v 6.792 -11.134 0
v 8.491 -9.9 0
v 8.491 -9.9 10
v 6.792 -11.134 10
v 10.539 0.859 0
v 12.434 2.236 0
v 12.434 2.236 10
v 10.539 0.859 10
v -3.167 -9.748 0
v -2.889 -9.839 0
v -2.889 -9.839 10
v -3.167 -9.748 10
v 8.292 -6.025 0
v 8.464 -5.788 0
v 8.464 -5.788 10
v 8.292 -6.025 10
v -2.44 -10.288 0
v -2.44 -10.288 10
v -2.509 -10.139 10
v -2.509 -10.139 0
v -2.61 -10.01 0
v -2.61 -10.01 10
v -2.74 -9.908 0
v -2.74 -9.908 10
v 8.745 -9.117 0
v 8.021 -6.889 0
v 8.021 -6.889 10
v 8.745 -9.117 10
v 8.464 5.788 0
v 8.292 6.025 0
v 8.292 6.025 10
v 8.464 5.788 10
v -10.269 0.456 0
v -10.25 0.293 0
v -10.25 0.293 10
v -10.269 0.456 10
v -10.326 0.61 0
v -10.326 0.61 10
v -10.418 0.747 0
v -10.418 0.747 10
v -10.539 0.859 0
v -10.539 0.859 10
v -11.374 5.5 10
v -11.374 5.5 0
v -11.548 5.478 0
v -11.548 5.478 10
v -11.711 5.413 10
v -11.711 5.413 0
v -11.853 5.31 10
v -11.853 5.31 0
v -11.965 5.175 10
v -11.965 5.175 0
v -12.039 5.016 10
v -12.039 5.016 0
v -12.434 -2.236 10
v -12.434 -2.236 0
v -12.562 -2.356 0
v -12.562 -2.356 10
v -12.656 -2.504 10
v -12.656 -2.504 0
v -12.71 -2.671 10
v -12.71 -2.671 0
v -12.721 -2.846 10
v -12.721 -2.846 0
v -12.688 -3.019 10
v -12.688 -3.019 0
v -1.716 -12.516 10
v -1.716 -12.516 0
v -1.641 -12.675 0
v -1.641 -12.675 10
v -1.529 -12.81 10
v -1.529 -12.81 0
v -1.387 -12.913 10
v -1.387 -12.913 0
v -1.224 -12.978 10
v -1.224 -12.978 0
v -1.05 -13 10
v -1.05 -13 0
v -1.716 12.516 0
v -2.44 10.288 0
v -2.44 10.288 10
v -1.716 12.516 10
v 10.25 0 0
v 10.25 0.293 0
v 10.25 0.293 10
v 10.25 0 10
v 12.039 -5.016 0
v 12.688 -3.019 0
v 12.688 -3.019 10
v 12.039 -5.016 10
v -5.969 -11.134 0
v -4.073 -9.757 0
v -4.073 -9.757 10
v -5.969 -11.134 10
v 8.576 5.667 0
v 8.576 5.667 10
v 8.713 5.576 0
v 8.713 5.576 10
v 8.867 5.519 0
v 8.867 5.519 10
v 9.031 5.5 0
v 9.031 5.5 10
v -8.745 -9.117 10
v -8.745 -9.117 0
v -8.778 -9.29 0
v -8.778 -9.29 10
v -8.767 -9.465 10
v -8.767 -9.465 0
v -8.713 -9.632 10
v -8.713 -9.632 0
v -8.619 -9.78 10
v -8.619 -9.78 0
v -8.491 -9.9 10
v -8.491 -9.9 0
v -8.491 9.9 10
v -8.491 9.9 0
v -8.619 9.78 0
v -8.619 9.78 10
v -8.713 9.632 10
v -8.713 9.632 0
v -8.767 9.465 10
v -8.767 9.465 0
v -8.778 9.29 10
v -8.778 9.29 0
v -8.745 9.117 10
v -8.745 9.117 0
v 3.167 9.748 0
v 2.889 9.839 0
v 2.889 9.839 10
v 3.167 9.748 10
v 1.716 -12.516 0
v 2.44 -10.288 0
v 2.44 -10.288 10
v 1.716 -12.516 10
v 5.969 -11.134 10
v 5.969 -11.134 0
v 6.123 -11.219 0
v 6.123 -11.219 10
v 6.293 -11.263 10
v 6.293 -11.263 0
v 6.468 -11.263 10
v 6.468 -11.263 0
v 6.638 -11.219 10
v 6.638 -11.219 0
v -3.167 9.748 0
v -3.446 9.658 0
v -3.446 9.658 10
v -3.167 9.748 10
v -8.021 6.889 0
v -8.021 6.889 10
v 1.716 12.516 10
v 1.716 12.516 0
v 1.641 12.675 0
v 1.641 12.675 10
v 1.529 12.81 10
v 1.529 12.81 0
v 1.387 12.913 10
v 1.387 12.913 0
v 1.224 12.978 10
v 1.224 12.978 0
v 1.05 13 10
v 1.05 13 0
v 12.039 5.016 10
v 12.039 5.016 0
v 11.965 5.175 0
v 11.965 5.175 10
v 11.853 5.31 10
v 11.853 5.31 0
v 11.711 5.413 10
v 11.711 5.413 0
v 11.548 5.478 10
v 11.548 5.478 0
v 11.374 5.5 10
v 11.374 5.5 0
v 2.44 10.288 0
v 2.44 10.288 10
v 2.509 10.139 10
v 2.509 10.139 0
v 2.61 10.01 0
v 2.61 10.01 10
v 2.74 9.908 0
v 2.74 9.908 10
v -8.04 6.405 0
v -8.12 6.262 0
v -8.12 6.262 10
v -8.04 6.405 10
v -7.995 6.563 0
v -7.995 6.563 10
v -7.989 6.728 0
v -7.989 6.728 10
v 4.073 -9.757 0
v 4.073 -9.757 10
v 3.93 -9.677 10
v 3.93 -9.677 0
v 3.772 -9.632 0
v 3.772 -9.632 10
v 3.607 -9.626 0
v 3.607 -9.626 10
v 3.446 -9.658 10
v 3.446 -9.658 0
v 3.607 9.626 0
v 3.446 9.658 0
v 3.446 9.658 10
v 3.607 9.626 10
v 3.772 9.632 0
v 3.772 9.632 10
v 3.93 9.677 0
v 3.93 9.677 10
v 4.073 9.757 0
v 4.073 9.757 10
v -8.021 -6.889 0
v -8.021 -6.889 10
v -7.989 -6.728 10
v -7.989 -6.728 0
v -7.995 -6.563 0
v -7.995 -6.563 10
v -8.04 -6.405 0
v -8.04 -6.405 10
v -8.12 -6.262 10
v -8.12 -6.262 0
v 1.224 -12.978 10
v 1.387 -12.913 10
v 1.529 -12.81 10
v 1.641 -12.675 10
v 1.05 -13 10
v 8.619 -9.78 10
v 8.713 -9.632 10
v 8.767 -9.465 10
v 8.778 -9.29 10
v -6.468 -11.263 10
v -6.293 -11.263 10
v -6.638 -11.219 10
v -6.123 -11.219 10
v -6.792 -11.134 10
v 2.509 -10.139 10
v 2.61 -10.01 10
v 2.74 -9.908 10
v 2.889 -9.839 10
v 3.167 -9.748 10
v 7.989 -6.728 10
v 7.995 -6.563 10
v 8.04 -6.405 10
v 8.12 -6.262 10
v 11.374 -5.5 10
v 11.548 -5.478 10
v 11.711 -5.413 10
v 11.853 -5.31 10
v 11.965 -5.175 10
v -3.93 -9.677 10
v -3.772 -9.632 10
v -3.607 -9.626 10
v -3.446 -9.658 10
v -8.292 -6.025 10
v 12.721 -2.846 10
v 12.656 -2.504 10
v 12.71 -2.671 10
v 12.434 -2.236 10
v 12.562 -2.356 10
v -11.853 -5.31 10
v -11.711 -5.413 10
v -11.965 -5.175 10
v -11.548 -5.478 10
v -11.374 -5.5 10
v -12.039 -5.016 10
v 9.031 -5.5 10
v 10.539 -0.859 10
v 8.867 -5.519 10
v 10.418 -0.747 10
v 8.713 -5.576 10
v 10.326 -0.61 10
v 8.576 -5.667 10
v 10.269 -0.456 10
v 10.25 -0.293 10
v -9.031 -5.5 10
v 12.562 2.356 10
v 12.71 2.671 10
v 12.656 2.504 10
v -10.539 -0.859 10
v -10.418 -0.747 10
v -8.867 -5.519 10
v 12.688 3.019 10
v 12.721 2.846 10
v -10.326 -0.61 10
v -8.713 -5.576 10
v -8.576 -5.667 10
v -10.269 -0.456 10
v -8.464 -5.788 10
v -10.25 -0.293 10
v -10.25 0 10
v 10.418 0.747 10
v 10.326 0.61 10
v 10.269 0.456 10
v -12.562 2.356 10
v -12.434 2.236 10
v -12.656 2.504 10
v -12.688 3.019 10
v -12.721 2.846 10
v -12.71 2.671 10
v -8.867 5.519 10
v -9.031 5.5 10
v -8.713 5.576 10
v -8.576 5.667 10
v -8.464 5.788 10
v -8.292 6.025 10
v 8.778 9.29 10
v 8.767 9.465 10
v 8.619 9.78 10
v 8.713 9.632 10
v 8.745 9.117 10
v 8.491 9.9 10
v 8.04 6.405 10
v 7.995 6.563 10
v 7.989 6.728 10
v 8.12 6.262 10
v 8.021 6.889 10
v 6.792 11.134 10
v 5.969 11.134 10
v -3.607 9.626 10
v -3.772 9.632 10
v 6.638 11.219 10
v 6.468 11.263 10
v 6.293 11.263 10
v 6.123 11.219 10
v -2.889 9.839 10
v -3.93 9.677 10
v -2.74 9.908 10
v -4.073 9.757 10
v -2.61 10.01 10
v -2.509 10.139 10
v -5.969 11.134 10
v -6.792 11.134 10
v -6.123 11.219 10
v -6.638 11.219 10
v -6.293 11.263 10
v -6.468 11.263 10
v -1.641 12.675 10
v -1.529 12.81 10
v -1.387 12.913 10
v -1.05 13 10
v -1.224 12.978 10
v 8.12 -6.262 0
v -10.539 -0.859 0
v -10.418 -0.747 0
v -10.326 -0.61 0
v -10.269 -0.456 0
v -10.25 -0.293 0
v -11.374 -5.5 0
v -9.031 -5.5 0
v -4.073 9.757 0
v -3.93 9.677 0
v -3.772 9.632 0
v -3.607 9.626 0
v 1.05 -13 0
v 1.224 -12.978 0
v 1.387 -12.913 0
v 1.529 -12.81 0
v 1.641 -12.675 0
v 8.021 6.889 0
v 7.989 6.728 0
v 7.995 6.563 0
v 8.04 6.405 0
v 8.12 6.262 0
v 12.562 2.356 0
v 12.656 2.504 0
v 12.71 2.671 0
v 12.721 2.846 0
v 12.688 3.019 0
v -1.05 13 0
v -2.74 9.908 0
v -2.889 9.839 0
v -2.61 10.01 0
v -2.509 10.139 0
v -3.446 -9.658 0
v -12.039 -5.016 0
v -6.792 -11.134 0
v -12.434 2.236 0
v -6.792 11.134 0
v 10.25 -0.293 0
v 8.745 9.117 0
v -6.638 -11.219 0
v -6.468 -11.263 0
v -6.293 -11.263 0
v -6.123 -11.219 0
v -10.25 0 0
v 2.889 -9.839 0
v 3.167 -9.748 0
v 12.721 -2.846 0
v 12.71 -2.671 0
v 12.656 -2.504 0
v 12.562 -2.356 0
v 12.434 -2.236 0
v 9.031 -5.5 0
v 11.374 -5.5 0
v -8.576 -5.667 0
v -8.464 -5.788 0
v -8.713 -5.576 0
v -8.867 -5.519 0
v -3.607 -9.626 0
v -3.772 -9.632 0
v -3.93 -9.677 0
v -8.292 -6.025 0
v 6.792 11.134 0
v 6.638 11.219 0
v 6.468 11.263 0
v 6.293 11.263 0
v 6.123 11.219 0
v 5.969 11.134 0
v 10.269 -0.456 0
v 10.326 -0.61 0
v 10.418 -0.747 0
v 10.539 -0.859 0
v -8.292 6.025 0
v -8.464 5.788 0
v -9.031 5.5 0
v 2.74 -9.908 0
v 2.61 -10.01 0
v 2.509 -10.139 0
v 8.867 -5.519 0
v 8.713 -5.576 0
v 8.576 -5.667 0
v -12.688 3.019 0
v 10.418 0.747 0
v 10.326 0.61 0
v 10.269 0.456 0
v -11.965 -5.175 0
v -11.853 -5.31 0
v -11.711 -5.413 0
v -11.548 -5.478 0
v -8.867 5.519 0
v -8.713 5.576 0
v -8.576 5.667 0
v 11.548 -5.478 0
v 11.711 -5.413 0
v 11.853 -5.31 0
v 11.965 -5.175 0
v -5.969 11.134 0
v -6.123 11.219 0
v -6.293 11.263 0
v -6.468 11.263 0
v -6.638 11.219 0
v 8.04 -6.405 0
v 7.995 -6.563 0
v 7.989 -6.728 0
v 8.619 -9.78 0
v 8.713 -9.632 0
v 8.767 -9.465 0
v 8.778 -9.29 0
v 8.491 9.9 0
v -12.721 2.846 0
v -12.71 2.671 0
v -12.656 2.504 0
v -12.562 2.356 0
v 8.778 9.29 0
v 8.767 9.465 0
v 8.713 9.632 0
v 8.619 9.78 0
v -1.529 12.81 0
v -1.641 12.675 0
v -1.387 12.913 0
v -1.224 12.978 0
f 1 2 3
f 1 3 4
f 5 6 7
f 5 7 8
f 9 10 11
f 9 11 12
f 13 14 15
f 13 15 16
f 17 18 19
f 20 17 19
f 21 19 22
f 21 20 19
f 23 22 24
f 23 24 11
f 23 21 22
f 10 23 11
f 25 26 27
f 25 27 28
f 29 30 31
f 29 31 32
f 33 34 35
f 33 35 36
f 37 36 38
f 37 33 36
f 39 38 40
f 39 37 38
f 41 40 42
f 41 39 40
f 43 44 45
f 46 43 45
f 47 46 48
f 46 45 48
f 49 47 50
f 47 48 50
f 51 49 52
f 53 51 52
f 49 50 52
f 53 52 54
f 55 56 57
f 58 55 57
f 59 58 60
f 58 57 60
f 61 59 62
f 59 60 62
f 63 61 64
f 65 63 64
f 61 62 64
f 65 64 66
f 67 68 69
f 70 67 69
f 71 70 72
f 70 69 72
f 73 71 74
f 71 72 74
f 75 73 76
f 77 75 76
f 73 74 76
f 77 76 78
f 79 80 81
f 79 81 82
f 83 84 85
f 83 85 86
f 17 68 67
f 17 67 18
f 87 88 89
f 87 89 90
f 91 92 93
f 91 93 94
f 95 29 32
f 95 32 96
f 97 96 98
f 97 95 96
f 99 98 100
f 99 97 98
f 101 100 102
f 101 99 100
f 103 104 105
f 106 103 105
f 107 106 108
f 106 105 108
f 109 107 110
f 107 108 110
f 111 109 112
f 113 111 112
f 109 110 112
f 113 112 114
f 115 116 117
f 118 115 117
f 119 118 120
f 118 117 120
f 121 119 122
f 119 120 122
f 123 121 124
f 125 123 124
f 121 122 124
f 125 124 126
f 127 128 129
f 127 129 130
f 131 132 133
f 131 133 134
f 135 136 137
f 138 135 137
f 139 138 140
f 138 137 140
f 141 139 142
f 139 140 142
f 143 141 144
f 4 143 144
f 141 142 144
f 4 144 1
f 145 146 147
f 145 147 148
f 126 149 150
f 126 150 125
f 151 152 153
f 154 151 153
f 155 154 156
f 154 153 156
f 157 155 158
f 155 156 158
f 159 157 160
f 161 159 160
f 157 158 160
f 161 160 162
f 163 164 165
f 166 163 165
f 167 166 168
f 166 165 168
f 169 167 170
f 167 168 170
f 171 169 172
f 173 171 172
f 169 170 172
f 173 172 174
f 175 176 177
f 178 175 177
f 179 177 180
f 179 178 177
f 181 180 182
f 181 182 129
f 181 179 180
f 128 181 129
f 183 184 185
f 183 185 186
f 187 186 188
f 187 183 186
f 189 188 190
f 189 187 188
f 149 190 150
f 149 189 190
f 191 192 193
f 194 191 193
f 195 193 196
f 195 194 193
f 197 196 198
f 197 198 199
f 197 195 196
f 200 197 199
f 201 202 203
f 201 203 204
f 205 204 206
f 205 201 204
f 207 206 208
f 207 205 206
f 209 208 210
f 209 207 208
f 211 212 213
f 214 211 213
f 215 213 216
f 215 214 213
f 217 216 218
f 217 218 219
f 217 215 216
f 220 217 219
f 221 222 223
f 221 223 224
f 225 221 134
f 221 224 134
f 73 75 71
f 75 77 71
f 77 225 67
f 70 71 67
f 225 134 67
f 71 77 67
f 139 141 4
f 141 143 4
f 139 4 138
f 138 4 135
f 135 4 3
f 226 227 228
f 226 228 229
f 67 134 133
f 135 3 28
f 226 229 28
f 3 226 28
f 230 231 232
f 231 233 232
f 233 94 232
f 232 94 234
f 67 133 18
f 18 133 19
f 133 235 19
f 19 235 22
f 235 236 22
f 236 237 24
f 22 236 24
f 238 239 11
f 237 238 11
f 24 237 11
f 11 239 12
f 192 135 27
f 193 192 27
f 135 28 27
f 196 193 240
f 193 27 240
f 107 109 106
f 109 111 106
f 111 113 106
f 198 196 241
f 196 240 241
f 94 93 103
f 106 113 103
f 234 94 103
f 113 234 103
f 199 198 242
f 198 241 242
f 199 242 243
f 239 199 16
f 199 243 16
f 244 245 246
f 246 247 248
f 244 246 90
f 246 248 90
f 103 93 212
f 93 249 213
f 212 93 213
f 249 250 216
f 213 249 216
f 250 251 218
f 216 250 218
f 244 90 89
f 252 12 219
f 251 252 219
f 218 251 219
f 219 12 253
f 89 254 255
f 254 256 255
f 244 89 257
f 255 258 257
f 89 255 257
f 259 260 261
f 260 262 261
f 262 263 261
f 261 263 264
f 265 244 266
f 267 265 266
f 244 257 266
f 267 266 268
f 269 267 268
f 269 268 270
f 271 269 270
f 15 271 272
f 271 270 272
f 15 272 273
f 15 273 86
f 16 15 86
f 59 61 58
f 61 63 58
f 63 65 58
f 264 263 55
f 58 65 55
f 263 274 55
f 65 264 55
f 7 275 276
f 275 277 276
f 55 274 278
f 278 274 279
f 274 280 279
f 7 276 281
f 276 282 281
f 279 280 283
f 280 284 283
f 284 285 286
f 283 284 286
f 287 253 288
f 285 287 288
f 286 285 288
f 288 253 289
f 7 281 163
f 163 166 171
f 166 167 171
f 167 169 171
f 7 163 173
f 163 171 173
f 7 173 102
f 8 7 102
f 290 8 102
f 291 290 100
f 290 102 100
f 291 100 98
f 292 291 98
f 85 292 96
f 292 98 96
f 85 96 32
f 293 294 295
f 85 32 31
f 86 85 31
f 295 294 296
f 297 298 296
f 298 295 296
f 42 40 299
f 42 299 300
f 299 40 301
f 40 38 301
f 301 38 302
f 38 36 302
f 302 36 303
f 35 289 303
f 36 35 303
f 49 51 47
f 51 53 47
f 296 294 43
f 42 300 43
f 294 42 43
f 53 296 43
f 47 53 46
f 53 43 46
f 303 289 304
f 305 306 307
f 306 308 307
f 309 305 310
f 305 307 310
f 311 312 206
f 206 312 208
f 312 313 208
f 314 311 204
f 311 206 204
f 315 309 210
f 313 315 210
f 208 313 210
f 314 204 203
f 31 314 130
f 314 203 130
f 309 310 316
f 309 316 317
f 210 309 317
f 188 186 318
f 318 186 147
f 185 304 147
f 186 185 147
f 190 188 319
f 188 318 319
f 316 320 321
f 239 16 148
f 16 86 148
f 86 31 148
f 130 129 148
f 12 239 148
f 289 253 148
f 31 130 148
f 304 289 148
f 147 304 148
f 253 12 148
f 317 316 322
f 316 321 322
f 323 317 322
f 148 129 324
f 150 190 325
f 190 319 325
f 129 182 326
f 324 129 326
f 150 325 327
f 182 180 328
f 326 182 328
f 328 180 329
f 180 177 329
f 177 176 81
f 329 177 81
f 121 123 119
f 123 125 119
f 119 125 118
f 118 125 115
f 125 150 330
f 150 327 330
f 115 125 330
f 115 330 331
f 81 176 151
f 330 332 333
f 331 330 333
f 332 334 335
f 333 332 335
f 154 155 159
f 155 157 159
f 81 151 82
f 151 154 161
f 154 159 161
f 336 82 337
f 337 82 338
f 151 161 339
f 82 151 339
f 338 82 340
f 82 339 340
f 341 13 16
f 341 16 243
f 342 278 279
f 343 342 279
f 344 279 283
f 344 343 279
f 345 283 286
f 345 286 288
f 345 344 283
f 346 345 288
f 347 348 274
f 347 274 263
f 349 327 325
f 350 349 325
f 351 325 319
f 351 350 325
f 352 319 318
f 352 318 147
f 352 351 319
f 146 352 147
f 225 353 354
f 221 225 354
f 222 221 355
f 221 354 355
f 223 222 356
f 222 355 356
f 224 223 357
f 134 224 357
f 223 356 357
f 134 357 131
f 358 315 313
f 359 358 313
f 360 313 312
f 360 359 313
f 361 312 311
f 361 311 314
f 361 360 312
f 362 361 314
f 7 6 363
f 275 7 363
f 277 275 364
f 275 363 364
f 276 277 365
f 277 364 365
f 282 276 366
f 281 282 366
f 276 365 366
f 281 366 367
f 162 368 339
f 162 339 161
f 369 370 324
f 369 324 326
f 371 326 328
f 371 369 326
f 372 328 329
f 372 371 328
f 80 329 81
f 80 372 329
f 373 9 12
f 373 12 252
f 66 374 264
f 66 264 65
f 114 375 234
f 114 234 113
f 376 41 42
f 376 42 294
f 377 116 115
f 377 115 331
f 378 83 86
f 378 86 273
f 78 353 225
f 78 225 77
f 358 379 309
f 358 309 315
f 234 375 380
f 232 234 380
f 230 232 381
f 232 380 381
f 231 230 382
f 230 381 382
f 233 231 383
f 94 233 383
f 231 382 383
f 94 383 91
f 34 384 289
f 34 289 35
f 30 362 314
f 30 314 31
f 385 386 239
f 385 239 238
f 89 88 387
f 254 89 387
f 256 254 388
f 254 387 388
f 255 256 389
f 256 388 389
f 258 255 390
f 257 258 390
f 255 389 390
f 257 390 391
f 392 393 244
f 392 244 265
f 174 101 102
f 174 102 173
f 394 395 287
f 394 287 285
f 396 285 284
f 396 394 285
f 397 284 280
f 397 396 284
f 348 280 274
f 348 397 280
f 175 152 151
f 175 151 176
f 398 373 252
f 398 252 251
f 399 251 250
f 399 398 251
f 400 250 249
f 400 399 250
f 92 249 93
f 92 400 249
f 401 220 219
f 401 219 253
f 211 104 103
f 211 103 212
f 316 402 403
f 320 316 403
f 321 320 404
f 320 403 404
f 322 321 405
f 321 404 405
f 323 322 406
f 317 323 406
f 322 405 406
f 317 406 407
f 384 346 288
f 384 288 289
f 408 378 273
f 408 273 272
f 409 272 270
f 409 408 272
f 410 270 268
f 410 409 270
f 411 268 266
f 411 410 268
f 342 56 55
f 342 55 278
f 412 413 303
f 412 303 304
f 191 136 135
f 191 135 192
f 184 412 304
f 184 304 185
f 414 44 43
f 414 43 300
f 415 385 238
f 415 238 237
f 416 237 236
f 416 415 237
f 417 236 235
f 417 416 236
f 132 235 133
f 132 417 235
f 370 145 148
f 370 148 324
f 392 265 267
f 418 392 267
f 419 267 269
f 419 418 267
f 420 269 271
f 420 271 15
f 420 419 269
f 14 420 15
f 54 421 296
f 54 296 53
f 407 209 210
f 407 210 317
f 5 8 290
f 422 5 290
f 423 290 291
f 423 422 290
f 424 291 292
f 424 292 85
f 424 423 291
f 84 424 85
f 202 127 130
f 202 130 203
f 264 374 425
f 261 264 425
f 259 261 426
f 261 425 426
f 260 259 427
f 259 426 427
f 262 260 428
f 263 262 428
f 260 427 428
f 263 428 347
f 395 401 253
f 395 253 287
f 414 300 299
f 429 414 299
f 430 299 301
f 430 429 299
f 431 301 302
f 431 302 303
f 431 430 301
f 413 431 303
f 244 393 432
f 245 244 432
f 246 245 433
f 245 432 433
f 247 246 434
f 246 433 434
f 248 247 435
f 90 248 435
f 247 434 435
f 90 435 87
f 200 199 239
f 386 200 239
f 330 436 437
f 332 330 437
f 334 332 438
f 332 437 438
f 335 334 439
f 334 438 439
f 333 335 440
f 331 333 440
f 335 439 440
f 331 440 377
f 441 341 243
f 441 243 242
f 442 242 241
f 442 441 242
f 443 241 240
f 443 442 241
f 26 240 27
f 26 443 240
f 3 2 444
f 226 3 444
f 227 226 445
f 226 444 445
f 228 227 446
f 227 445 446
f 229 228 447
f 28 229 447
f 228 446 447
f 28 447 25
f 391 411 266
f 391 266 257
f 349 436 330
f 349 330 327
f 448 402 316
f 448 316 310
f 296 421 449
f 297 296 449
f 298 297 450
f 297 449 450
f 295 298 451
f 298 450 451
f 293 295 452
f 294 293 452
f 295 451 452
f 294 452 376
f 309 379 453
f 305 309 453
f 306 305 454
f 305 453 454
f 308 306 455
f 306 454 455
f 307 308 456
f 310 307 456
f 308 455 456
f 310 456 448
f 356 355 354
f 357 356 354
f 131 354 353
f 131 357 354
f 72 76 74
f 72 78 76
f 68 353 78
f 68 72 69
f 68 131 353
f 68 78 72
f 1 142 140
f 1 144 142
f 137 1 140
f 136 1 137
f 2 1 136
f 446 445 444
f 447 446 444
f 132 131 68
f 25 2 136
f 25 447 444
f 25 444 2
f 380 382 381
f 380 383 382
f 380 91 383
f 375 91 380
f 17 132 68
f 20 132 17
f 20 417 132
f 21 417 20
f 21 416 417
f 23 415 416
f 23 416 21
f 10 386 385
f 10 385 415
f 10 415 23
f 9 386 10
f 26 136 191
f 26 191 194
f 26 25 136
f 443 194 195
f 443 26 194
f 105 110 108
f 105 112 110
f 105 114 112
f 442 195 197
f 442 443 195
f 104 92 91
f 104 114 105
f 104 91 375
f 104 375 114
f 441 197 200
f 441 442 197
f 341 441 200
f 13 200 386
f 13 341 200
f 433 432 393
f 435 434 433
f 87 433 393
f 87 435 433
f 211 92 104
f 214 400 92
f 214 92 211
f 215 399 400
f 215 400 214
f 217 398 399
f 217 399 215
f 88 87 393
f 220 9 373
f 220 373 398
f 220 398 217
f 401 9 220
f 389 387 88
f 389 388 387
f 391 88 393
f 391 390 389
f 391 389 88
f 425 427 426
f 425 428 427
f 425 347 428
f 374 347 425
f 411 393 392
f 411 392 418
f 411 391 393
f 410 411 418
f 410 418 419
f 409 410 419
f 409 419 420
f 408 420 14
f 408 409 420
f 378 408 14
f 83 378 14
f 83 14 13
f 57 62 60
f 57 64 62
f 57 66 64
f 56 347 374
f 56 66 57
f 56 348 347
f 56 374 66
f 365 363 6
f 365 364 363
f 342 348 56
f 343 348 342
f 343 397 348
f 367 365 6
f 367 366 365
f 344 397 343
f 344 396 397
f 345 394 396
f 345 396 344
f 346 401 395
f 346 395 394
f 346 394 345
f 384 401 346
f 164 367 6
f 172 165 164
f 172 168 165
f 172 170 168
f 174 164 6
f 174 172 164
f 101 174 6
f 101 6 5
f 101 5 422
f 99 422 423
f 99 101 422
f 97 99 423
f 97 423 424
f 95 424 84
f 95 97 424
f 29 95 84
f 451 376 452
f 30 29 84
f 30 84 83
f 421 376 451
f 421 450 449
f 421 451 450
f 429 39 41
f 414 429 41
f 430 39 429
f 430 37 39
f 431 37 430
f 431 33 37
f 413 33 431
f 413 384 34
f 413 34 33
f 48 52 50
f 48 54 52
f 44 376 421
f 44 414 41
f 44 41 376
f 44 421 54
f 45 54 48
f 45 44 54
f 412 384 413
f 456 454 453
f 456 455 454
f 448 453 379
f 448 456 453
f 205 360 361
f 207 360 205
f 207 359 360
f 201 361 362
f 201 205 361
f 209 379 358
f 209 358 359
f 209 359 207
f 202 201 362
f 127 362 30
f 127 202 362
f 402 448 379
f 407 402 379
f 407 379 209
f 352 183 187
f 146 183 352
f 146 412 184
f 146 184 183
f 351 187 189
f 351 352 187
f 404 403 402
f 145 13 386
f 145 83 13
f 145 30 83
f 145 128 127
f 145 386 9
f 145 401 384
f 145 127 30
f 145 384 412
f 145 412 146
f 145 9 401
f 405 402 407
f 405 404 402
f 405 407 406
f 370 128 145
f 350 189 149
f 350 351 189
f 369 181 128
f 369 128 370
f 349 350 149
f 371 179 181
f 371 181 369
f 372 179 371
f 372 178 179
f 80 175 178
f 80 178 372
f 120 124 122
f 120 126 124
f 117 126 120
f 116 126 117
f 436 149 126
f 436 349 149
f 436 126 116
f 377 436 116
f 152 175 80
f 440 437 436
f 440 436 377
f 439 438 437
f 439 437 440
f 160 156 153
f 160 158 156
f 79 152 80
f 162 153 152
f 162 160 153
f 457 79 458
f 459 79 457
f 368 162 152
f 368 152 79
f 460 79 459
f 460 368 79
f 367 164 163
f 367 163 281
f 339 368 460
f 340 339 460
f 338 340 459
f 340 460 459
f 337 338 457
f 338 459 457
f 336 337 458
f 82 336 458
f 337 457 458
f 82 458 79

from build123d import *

# Parameters (mm, degrees)
PAD_DEPTH          = 10
POLARPATTERN_COUNT = 10


with BuildPart() as part:
    # Sketch002 → Pad (new body)
    with BuildSketch(Plane.XY):
        with BuildLine():
            Line((8.292424, -6.024799), (8.12043, -6.261529))
            ThreePointArc((8.12043, -6.261529), (7.99536, -6.563475), (8.021002, -6.889291))
            Line((8.021002, -6.889291), (8.744966, -9.117423))
            ThreePointArc((8.490676, -9.900046), (8.744966, -9.550046), (8.744966, -9.117423))
            Line((8.490676, -9.900046), (6.79174, -11.134395))
            ThreePointArc((5.968841, -11.134395), (6.380291, -11.268084), (6.79174, -11.134395))
            Line((5.968841, -11.134395), (4.073479, -9.757334))
            ThreePointArc((4.073479, -9.757334), (3.771533, -9.632264), (3.445717, -9.657906))
            Line((3.445717, -9.657906), (3.167424, -9.748329))
            Line((0, 0), (3.167424, -9.748329))
            Line((0, 0), (8.292424, -6.024799))
        make_face()
    pad = extrude(amount=PAD_DEPTH)

    # PolarPattern: Pad ×10 about axis
    polarpattern_axis = Axis((0, 0, 0), (0, 0, 1))
    for i in range(1, POLARPATTERN_COUNT):
        add(pad.rotate(polarpattern_axis, i * 360 / POLARPATTERN_COUNT))


solid = part.part
